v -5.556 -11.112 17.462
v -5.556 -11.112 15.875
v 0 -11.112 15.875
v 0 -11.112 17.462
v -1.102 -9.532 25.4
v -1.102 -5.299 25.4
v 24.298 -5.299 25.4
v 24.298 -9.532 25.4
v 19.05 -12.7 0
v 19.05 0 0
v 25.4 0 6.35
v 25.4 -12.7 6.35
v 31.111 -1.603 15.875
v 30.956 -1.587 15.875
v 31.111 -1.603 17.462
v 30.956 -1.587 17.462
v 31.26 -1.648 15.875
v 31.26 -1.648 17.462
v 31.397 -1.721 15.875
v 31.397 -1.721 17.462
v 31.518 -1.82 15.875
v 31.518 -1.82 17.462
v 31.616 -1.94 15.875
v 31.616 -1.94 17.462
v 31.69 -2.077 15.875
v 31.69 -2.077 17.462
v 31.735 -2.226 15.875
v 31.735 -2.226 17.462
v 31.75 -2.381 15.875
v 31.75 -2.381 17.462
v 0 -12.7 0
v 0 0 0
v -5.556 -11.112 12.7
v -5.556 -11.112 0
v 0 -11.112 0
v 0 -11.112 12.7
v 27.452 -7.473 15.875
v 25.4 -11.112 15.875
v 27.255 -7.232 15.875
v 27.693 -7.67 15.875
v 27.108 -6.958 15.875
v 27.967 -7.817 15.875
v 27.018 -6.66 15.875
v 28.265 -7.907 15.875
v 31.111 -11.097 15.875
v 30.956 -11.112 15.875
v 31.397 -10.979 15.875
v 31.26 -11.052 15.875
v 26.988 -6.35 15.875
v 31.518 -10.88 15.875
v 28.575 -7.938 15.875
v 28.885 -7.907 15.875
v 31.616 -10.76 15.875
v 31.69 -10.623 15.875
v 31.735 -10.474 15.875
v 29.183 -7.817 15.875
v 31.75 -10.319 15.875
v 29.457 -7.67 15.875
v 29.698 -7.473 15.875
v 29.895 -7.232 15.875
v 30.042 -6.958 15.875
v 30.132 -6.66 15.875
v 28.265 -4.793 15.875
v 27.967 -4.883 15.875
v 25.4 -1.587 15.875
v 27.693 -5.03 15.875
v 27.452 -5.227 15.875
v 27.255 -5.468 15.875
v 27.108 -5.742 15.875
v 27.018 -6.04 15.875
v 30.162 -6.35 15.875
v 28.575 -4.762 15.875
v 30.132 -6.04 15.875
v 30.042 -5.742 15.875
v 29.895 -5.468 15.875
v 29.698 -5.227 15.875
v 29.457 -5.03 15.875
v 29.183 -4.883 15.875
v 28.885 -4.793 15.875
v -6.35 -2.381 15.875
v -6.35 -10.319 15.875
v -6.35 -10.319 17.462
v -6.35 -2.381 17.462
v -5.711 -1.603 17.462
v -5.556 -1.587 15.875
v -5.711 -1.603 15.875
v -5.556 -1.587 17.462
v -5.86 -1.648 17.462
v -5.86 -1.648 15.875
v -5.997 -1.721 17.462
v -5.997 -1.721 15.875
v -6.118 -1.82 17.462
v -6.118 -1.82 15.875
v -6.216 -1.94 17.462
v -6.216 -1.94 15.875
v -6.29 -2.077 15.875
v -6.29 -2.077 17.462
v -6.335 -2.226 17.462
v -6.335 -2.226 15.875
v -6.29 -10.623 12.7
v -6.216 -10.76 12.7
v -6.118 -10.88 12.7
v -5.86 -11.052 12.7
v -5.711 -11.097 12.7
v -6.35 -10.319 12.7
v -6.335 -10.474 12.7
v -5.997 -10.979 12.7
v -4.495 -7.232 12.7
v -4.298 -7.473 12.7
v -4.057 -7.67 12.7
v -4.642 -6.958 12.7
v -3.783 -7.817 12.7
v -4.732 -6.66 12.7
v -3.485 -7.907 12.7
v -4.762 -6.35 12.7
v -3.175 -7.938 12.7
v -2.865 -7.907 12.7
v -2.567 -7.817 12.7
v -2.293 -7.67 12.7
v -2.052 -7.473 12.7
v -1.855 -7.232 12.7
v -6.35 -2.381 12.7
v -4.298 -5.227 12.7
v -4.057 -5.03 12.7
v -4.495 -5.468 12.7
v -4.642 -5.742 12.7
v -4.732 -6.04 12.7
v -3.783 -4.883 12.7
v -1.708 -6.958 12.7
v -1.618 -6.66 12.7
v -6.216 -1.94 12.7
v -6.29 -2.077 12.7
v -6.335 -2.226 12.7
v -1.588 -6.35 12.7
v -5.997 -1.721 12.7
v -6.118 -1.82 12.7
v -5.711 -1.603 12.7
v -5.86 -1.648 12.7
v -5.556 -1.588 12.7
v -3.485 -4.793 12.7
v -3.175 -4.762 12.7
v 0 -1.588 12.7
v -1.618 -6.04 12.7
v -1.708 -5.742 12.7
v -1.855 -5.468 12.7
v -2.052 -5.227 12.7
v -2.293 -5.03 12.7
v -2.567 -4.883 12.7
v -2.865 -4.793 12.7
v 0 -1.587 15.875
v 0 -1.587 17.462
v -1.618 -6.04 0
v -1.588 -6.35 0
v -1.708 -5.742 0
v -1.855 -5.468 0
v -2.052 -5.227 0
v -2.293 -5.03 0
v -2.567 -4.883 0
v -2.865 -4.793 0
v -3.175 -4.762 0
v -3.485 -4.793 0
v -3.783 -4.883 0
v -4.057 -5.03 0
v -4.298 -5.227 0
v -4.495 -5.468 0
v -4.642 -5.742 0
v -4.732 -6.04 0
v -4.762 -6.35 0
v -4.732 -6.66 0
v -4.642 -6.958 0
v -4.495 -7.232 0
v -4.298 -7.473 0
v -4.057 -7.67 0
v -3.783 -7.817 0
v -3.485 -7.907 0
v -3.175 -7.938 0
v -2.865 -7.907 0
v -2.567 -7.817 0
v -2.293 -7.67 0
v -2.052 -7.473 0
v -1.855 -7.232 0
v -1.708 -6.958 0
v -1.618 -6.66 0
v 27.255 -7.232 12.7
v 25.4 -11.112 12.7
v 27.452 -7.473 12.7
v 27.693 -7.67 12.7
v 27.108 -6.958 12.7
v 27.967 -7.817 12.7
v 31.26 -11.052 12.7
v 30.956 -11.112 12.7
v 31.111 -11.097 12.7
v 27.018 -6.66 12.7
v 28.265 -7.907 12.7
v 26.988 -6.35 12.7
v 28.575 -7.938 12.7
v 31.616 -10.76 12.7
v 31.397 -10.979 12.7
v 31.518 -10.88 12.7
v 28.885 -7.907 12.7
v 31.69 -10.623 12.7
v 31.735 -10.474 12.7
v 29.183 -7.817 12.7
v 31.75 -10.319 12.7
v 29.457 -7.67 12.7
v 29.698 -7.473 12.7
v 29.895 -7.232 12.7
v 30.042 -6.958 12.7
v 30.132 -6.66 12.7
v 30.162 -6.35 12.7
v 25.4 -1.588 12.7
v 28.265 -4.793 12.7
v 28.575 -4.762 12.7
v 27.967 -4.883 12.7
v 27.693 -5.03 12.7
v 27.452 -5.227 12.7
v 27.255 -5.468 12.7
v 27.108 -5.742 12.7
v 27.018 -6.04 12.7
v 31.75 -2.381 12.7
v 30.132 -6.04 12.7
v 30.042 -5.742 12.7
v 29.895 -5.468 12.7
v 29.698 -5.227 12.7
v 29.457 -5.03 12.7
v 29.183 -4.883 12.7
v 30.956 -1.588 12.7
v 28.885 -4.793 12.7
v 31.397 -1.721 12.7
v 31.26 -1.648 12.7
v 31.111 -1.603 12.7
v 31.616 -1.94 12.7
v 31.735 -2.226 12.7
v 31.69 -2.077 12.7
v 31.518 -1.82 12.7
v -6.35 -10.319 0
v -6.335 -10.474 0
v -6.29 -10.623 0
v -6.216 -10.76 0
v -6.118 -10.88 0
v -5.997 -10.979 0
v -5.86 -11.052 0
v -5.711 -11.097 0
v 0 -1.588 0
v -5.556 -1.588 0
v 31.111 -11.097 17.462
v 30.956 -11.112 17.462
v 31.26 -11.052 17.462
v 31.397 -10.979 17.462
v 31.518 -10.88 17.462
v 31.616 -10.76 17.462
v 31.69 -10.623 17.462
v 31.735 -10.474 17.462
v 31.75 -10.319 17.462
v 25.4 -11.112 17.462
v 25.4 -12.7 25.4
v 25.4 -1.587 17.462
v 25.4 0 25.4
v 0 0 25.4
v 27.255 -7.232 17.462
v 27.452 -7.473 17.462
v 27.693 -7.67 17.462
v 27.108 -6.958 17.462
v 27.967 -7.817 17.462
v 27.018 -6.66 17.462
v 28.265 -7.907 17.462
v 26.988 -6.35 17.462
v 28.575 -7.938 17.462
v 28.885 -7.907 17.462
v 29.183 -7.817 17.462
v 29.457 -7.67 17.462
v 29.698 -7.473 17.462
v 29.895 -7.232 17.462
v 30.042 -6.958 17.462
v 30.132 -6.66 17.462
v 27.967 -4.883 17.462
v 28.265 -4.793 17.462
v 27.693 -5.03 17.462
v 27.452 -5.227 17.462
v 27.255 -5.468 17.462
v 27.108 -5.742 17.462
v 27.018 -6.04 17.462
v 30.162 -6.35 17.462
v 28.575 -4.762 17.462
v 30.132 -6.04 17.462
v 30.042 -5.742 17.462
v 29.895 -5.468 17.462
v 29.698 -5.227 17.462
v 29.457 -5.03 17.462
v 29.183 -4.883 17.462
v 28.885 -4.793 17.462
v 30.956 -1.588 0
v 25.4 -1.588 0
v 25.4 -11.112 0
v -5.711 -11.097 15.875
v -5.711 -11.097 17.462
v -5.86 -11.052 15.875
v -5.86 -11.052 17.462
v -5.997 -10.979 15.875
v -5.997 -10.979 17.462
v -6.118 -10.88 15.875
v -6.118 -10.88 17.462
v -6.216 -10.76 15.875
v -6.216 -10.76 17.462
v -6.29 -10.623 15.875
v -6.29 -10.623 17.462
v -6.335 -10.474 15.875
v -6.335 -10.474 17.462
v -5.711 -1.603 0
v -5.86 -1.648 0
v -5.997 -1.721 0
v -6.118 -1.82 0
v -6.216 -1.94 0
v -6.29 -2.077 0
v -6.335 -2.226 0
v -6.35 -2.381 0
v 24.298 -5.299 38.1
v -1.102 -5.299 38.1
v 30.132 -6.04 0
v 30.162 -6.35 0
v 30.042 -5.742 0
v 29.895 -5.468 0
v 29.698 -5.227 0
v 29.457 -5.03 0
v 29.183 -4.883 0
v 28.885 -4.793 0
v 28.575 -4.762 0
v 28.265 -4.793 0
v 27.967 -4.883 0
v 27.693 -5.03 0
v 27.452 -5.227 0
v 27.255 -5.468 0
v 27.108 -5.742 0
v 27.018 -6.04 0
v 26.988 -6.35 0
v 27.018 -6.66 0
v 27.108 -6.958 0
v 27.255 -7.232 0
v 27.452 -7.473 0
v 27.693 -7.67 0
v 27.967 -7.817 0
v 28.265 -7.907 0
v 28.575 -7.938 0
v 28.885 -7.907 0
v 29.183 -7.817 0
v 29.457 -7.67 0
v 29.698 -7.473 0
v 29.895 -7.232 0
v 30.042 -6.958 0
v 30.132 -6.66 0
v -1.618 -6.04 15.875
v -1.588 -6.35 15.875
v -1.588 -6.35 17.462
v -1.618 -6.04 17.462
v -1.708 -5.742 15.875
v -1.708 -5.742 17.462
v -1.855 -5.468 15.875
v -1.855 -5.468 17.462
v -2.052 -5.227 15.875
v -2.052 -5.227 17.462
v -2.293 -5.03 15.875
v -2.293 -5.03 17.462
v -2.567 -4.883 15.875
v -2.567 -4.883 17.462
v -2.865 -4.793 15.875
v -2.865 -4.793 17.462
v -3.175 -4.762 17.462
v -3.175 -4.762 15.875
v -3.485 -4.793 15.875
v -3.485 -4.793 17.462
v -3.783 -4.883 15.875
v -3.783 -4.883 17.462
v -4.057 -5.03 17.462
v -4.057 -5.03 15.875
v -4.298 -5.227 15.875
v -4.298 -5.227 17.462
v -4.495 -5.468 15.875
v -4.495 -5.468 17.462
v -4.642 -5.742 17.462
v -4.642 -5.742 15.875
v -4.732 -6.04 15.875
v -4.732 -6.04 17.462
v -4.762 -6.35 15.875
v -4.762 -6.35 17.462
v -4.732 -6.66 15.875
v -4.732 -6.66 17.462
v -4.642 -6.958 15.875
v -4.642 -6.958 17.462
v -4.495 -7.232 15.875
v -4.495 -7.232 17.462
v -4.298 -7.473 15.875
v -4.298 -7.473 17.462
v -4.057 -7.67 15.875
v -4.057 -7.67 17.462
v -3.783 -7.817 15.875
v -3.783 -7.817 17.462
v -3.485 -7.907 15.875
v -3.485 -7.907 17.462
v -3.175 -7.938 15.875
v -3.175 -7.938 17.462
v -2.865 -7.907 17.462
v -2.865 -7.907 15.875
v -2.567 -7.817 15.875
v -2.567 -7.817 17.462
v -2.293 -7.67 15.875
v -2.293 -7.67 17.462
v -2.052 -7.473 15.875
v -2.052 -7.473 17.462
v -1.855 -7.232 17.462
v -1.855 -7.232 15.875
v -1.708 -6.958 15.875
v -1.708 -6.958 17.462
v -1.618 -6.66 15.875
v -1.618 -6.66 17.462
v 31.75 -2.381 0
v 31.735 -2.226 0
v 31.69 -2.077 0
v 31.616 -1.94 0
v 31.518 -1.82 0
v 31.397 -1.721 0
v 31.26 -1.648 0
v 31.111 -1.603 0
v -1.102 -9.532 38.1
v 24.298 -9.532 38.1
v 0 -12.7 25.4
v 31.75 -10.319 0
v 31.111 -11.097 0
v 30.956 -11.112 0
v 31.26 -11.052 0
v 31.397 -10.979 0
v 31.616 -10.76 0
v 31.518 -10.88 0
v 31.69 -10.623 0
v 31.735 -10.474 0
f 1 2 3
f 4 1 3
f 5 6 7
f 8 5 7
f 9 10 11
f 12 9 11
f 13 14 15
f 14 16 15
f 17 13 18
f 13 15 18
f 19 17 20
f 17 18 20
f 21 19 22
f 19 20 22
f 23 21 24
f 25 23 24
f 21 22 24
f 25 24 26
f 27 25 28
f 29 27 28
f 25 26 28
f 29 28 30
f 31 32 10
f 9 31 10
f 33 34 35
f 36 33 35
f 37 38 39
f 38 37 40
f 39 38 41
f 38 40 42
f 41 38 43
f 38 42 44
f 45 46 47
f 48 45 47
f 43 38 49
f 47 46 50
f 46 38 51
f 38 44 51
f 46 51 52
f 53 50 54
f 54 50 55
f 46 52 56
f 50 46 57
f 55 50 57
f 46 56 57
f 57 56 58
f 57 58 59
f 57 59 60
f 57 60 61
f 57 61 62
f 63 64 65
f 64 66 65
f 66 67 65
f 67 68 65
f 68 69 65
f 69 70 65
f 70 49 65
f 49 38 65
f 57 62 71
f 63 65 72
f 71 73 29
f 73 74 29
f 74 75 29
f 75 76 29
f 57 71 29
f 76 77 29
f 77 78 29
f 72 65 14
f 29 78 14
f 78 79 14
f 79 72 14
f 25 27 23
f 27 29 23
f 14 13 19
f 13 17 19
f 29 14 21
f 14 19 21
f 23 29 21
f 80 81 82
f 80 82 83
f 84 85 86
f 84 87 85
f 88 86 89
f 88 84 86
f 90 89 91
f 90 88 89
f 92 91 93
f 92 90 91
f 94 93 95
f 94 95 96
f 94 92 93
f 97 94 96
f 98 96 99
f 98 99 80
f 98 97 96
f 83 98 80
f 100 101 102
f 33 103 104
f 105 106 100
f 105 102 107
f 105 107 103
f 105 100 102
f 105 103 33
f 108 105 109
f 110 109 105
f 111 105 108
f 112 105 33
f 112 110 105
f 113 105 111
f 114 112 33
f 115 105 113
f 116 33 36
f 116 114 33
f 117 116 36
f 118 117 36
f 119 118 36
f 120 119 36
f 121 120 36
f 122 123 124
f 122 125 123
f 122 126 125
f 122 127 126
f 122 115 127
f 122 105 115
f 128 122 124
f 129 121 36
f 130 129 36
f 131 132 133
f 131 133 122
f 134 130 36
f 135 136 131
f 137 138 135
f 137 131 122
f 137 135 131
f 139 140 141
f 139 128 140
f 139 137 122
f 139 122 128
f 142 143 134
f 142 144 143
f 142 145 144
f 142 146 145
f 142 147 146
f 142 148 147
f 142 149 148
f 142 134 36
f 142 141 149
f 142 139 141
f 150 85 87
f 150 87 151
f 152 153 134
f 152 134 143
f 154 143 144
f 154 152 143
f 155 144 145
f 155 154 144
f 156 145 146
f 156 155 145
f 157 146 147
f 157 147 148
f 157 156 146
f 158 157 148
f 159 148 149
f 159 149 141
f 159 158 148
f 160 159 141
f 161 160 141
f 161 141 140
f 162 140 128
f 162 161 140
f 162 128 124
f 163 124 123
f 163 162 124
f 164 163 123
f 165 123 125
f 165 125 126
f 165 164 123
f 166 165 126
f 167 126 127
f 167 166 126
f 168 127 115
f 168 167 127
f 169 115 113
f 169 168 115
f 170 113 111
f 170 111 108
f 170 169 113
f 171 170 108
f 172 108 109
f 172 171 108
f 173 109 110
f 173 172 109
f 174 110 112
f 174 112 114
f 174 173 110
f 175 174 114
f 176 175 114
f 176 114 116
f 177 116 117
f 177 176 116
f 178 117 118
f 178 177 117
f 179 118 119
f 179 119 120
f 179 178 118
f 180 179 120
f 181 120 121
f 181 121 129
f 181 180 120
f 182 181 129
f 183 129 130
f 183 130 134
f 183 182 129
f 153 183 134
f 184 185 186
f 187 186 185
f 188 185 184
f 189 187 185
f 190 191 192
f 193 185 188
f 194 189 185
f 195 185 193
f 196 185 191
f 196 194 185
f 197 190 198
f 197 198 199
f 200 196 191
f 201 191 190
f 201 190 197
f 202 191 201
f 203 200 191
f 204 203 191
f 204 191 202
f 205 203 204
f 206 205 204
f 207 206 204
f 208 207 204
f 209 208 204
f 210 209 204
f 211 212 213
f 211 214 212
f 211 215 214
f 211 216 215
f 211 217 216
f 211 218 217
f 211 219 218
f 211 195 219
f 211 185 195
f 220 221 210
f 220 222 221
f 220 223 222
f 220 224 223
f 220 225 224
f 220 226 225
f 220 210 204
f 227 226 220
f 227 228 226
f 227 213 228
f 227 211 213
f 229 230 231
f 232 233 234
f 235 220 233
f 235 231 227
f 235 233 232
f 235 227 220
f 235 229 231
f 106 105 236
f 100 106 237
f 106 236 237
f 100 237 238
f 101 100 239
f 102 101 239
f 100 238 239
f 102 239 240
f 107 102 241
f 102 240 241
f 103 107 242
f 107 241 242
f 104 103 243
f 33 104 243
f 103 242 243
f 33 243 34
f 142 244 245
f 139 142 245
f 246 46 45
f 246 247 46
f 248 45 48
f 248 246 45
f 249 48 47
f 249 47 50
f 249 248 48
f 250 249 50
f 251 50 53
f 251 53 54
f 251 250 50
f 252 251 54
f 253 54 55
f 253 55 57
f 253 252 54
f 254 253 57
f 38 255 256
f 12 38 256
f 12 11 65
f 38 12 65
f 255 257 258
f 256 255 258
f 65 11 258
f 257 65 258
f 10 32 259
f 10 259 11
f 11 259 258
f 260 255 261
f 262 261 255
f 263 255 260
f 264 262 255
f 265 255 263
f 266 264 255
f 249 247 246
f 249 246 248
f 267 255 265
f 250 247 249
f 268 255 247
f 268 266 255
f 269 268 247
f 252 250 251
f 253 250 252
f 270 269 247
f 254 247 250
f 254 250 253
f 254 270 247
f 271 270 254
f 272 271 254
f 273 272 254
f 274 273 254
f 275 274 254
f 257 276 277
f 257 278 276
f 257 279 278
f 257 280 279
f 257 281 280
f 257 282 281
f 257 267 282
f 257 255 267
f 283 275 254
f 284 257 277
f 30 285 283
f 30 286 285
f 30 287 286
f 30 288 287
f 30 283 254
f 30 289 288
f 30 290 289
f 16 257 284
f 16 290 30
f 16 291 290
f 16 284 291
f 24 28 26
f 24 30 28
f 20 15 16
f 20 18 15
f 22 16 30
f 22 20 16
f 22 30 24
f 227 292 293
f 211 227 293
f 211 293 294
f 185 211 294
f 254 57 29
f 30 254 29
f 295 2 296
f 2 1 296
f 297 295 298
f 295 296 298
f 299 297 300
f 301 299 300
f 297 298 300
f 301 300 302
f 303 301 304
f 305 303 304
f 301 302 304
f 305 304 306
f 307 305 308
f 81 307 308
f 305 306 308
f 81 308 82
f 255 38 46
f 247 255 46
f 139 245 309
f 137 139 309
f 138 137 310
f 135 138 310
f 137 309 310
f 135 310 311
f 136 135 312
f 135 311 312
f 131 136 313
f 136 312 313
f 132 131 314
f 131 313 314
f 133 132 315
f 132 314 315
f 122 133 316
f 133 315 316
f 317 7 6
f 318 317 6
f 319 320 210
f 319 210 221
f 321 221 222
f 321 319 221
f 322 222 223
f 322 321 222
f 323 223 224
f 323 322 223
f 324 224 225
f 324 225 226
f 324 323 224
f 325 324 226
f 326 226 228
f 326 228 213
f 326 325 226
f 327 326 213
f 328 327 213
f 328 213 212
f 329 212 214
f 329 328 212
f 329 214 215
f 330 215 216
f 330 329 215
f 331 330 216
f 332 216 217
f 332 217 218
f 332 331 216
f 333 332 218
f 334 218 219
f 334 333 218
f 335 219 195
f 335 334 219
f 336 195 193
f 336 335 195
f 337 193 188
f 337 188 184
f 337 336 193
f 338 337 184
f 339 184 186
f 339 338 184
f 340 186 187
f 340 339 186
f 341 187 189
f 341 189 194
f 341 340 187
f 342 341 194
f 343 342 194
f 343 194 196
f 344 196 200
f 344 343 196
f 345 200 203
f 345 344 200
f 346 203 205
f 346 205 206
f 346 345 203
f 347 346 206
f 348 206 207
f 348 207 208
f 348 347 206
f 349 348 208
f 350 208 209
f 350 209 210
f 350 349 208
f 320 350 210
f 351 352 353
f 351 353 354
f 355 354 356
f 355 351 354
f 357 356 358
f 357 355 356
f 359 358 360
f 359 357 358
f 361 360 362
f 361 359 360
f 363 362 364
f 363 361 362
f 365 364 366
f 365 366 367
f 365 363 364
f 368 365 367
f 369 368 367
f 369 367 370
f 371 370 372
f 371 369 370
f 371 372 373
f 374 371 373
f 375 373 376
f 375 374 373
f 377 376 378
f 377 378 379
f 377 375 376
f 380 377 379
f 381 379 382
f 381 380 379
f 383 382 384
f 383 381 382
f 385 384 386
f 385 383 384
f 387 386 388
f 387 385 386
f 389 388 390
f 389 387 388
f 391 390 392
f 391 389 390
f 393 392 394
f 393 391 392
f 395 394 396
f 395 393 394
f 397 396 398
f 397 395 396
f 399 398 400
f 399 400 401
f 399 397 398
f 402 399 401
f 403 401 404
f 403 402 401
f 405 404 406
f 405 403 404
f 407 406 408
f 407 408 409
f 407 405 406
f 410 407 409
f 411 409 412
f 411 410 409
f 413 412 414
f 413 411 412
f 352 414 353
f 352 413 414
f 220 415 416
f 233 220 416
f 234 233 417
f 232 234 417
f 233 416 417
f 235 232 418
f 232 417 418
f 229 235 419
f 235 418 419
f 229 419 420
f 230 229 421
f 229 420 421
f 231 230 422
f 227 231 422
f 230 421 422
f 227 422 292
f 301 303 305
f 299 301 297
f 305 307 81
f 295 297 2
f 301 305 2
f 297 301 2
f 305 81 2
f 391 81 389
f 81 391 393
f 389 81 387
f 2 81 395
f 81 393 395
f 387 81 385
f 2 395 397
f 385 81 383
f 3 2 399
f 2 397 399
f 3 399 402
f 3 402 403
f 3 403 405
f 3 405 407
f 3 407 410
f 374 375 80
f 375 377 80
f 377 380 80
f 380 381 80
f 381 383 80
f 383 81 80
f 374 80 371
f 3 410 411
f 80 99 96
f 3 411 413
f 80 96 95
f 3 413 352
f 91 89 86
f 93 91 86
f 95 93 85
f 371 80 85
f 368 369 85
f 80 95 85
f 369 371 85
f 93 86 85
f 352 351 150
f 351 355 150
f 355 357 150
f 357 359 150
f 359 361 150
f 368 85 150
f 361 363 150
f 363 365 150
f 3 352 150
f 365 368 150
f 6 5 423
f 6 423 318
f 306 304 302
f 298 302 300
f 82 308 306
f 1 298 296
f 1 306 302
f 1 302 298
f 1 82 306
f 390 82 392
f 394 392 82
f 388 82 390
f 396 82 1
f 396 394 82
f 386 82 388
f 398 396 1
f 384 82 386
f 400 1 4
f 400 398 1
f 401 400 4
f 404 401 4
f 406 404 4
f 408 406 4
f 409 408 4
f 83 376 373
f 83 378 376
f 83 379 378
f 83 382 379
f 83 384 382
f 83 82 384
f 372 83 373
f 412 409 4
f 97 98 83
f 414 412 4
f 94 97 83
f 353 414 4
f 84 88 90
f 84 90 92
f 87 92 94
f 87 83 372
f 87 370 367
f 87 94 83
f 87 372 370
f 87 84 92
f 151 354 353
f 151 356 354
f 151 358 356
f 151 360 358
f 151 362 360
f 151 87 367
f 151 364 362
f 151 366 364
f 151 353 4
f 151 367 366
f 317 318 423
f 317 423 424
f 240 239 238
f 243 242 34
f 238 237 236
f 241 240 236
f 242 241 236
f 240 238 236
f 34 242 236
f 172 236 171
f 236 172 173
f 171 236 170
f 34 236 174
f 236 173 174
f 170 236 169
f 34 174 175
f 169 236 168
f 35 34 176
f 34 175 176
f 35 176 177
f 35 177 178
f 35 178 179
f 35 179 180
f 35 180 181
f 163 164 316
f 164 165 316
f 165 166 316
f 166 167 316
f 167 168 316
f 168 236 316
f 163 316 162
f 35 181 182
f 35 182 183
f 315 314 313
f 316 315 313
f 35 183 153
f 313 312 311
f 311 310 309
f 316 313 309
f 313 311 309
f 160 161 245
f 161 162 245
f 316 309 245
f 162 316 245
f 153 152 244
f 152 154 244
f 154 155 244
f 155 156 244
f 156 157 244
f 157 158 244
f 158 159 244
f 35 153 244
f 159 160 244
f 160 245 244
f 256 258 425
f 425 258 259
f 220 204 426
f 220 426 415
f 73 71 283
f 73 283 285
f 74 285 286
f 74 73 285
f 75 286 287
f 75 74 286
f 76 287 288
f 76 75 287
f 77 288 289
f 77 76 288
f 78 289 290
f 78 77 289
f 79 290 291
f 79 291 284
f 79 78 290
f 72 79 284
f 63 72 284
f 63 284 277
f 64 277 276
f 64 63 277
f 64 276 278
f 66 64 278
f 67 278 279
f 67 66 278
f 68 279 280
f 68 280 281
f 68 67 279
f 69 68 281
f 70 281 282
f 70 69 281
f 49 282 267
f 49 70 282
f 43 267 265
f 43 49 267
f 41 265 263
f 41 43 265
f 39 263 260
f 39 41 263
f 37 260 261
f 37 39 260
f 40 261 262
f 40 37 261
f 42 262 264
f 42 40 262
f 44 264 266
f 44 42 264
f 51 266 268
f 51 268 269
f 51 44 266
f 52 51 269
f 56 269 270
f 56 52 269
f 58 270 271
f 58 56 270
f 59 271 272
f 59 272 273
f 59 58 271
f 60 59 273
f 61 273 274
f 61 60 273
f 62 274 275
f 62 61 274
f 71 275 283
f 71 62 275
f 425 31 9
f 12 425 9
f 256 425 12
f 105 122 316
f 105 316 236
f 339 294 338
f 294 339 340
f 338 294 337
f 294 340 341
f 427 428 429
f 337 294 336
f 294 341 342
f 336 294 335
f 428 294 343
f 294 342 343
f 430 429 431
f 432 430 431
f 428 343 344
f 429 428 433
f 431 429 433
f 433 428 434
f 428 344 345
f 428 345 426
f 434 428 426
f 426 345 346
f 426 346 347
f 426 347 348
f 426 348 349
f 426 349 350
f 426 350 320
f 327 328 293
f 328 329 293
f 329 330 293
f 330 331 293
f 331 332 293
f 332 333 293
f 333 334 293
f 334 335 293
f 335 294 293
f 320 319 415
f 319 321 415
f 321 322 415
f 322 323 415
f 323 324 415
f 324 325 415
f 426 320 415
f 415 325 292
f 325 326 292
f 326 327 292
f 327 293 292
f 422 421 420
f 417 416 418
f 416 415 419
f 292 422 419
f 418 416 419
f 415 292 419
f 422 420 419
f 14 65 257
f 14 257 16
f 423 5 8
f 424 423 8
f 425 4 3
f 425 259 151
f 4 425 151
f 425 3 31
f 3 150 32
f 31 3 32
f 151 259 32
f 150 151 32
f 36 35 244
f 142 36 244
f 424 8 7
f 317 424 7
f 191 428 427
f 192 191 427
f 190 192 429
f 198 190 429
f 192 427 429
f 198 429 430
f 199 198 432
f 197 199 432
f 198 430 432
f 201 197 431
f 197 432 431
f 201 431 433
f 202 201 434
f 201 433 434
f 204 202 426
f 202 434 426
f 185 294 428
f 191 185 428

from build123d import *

# Parameters (mm, degrees)
F1_DEPTH  = 12.7
F3_W      = 6.35
F3_H      = 9.525
F3_R      = 1.5875
F4_DEPTH  = 1.5875
F5_DEPTH  = 1.5875
F6_R      = 0.79375
F7_R      = 1.5875
F8_DEPTH  = 12.7
F9_W      = 24.2983907599
F9_H      = 4.2333333333
F9_W_2    = 1.1016092401
F10_DEPTH = 12.7


with BuildPart() as f1:
    # F0 (on Front) → F1 (new body)
    with BuildSketch(Plane.XZ):
        Polygon((0, 25.4), (0, 0), (19.05, 0), (25.4, 6.35), (25.4, 25.4), align=None)
    extrude(amount=F1_DEPTH)

    # F3 (on offset) → F4 (join)
    with BuildSketch(Plane.XY.offset(15.875)):
        with Locations((-3.175, -6.35)):
            Rectangle(F3_W, F3_H)
        with Locations((-3.175, -6.35)):
            Circle(F3_R, mode=Mode.SUBTRACT)
    extrude(amount=F4_DEPTH)

    # F3 (on offset) → F5 (join)
    with BuildSketch(Plane.XY.offset(15.875)):
        with Locations((28.575, -6.35)):
            Rectangle(F3_W, F3_H)
        with Locations((28.575, -6.35)):
            Circle(F3_R, mode=Mode.SUBTRACT)
    extrude(amount=F5_DEPTH)

    # F6
    f6_edges = [f1.edges().sort_by_distance(p)[0] for p in [
        (31.75, -11.1125, 16.66875),
        (-6.35, -11.1125, 16.66875),
        (31.75, -1.5875, 16.66875),
        (-6.35, -1.5875, 16.66875),
    ]]
    fillet(f6_edges, radius=F6_R)


with BuildPart() as f8:
    # F7 (on Top) → F8 (new body)
    with BuildSketch(Plane.XY):
        with BuildLine():
            Line((25.4, -1.5875), (25.4, -11.1125))
            Line((25.4, -11.1125), (30.95625, -11.1125))
            ThreePointArc((30.95625, -11.1125), (31.5175160076, -10.8800160076), (31.75, -10.31875))
            Line((31.75, -10.31875), (31.75, -2.38125))
            ThreePointArc((31.75, -2.38125), (31.5175160076, -1.8199839924), (30.95625, -1.5875))
            Line((30.95625, -1.5875), (25.4, -1.5875))
        make_face()
        with Locations((28.575, -6.35)):
            Circle(F7_R, mode=Mode.SUBTRACT)
    extrude(amount=F8_DEPTH)


with BuildPart() as f8b:
    # F7 (on Top) → F8, piece 2 (new body)
    with BuildSketch(Plane.XY):
        with BuildLine():
            Line((0, -11.1125), (0, -1.5875))
            Line((0, -1.5875), (-5.55625, -1.5875))
            ThreePointArc((-5.55625, -1.5875), (-6.1175160076, -1.8199839924), (-6.35, -2.38125))
            Line((-6.35, -2.38125), (-6.35, -10.31875))
            ThreePointArc((-6.35, -10.31875), (-6.1175160076, -10.8800160076), (-5.55625, -11.1125))
            Line((-5.55625, -11.1125), (0, -11.1125))
        make_face()
        with Locations((-3.175, -6.35)):
            Circle(F7_R, mode=Mode.SUBTRACT)
    extrude(amount=F8_DEPTH)


with BuildPart() as f10:
    # F9 (on face) → F10 (new body)
    with BuildSketch(Plane.XY.offset(25.4)):
        with Locations((12.14919538, -7.41574509)):
            Rectangle(F9_W, F9_H)
        with Locations((-0.55080462, -7.41574509)):
            Rectangle(F9_W_2, F9_H)
    extrude(amount=F10_DEPTH)


solid = Compound([f1.part, f8.part, f8b.part, f10.part])
